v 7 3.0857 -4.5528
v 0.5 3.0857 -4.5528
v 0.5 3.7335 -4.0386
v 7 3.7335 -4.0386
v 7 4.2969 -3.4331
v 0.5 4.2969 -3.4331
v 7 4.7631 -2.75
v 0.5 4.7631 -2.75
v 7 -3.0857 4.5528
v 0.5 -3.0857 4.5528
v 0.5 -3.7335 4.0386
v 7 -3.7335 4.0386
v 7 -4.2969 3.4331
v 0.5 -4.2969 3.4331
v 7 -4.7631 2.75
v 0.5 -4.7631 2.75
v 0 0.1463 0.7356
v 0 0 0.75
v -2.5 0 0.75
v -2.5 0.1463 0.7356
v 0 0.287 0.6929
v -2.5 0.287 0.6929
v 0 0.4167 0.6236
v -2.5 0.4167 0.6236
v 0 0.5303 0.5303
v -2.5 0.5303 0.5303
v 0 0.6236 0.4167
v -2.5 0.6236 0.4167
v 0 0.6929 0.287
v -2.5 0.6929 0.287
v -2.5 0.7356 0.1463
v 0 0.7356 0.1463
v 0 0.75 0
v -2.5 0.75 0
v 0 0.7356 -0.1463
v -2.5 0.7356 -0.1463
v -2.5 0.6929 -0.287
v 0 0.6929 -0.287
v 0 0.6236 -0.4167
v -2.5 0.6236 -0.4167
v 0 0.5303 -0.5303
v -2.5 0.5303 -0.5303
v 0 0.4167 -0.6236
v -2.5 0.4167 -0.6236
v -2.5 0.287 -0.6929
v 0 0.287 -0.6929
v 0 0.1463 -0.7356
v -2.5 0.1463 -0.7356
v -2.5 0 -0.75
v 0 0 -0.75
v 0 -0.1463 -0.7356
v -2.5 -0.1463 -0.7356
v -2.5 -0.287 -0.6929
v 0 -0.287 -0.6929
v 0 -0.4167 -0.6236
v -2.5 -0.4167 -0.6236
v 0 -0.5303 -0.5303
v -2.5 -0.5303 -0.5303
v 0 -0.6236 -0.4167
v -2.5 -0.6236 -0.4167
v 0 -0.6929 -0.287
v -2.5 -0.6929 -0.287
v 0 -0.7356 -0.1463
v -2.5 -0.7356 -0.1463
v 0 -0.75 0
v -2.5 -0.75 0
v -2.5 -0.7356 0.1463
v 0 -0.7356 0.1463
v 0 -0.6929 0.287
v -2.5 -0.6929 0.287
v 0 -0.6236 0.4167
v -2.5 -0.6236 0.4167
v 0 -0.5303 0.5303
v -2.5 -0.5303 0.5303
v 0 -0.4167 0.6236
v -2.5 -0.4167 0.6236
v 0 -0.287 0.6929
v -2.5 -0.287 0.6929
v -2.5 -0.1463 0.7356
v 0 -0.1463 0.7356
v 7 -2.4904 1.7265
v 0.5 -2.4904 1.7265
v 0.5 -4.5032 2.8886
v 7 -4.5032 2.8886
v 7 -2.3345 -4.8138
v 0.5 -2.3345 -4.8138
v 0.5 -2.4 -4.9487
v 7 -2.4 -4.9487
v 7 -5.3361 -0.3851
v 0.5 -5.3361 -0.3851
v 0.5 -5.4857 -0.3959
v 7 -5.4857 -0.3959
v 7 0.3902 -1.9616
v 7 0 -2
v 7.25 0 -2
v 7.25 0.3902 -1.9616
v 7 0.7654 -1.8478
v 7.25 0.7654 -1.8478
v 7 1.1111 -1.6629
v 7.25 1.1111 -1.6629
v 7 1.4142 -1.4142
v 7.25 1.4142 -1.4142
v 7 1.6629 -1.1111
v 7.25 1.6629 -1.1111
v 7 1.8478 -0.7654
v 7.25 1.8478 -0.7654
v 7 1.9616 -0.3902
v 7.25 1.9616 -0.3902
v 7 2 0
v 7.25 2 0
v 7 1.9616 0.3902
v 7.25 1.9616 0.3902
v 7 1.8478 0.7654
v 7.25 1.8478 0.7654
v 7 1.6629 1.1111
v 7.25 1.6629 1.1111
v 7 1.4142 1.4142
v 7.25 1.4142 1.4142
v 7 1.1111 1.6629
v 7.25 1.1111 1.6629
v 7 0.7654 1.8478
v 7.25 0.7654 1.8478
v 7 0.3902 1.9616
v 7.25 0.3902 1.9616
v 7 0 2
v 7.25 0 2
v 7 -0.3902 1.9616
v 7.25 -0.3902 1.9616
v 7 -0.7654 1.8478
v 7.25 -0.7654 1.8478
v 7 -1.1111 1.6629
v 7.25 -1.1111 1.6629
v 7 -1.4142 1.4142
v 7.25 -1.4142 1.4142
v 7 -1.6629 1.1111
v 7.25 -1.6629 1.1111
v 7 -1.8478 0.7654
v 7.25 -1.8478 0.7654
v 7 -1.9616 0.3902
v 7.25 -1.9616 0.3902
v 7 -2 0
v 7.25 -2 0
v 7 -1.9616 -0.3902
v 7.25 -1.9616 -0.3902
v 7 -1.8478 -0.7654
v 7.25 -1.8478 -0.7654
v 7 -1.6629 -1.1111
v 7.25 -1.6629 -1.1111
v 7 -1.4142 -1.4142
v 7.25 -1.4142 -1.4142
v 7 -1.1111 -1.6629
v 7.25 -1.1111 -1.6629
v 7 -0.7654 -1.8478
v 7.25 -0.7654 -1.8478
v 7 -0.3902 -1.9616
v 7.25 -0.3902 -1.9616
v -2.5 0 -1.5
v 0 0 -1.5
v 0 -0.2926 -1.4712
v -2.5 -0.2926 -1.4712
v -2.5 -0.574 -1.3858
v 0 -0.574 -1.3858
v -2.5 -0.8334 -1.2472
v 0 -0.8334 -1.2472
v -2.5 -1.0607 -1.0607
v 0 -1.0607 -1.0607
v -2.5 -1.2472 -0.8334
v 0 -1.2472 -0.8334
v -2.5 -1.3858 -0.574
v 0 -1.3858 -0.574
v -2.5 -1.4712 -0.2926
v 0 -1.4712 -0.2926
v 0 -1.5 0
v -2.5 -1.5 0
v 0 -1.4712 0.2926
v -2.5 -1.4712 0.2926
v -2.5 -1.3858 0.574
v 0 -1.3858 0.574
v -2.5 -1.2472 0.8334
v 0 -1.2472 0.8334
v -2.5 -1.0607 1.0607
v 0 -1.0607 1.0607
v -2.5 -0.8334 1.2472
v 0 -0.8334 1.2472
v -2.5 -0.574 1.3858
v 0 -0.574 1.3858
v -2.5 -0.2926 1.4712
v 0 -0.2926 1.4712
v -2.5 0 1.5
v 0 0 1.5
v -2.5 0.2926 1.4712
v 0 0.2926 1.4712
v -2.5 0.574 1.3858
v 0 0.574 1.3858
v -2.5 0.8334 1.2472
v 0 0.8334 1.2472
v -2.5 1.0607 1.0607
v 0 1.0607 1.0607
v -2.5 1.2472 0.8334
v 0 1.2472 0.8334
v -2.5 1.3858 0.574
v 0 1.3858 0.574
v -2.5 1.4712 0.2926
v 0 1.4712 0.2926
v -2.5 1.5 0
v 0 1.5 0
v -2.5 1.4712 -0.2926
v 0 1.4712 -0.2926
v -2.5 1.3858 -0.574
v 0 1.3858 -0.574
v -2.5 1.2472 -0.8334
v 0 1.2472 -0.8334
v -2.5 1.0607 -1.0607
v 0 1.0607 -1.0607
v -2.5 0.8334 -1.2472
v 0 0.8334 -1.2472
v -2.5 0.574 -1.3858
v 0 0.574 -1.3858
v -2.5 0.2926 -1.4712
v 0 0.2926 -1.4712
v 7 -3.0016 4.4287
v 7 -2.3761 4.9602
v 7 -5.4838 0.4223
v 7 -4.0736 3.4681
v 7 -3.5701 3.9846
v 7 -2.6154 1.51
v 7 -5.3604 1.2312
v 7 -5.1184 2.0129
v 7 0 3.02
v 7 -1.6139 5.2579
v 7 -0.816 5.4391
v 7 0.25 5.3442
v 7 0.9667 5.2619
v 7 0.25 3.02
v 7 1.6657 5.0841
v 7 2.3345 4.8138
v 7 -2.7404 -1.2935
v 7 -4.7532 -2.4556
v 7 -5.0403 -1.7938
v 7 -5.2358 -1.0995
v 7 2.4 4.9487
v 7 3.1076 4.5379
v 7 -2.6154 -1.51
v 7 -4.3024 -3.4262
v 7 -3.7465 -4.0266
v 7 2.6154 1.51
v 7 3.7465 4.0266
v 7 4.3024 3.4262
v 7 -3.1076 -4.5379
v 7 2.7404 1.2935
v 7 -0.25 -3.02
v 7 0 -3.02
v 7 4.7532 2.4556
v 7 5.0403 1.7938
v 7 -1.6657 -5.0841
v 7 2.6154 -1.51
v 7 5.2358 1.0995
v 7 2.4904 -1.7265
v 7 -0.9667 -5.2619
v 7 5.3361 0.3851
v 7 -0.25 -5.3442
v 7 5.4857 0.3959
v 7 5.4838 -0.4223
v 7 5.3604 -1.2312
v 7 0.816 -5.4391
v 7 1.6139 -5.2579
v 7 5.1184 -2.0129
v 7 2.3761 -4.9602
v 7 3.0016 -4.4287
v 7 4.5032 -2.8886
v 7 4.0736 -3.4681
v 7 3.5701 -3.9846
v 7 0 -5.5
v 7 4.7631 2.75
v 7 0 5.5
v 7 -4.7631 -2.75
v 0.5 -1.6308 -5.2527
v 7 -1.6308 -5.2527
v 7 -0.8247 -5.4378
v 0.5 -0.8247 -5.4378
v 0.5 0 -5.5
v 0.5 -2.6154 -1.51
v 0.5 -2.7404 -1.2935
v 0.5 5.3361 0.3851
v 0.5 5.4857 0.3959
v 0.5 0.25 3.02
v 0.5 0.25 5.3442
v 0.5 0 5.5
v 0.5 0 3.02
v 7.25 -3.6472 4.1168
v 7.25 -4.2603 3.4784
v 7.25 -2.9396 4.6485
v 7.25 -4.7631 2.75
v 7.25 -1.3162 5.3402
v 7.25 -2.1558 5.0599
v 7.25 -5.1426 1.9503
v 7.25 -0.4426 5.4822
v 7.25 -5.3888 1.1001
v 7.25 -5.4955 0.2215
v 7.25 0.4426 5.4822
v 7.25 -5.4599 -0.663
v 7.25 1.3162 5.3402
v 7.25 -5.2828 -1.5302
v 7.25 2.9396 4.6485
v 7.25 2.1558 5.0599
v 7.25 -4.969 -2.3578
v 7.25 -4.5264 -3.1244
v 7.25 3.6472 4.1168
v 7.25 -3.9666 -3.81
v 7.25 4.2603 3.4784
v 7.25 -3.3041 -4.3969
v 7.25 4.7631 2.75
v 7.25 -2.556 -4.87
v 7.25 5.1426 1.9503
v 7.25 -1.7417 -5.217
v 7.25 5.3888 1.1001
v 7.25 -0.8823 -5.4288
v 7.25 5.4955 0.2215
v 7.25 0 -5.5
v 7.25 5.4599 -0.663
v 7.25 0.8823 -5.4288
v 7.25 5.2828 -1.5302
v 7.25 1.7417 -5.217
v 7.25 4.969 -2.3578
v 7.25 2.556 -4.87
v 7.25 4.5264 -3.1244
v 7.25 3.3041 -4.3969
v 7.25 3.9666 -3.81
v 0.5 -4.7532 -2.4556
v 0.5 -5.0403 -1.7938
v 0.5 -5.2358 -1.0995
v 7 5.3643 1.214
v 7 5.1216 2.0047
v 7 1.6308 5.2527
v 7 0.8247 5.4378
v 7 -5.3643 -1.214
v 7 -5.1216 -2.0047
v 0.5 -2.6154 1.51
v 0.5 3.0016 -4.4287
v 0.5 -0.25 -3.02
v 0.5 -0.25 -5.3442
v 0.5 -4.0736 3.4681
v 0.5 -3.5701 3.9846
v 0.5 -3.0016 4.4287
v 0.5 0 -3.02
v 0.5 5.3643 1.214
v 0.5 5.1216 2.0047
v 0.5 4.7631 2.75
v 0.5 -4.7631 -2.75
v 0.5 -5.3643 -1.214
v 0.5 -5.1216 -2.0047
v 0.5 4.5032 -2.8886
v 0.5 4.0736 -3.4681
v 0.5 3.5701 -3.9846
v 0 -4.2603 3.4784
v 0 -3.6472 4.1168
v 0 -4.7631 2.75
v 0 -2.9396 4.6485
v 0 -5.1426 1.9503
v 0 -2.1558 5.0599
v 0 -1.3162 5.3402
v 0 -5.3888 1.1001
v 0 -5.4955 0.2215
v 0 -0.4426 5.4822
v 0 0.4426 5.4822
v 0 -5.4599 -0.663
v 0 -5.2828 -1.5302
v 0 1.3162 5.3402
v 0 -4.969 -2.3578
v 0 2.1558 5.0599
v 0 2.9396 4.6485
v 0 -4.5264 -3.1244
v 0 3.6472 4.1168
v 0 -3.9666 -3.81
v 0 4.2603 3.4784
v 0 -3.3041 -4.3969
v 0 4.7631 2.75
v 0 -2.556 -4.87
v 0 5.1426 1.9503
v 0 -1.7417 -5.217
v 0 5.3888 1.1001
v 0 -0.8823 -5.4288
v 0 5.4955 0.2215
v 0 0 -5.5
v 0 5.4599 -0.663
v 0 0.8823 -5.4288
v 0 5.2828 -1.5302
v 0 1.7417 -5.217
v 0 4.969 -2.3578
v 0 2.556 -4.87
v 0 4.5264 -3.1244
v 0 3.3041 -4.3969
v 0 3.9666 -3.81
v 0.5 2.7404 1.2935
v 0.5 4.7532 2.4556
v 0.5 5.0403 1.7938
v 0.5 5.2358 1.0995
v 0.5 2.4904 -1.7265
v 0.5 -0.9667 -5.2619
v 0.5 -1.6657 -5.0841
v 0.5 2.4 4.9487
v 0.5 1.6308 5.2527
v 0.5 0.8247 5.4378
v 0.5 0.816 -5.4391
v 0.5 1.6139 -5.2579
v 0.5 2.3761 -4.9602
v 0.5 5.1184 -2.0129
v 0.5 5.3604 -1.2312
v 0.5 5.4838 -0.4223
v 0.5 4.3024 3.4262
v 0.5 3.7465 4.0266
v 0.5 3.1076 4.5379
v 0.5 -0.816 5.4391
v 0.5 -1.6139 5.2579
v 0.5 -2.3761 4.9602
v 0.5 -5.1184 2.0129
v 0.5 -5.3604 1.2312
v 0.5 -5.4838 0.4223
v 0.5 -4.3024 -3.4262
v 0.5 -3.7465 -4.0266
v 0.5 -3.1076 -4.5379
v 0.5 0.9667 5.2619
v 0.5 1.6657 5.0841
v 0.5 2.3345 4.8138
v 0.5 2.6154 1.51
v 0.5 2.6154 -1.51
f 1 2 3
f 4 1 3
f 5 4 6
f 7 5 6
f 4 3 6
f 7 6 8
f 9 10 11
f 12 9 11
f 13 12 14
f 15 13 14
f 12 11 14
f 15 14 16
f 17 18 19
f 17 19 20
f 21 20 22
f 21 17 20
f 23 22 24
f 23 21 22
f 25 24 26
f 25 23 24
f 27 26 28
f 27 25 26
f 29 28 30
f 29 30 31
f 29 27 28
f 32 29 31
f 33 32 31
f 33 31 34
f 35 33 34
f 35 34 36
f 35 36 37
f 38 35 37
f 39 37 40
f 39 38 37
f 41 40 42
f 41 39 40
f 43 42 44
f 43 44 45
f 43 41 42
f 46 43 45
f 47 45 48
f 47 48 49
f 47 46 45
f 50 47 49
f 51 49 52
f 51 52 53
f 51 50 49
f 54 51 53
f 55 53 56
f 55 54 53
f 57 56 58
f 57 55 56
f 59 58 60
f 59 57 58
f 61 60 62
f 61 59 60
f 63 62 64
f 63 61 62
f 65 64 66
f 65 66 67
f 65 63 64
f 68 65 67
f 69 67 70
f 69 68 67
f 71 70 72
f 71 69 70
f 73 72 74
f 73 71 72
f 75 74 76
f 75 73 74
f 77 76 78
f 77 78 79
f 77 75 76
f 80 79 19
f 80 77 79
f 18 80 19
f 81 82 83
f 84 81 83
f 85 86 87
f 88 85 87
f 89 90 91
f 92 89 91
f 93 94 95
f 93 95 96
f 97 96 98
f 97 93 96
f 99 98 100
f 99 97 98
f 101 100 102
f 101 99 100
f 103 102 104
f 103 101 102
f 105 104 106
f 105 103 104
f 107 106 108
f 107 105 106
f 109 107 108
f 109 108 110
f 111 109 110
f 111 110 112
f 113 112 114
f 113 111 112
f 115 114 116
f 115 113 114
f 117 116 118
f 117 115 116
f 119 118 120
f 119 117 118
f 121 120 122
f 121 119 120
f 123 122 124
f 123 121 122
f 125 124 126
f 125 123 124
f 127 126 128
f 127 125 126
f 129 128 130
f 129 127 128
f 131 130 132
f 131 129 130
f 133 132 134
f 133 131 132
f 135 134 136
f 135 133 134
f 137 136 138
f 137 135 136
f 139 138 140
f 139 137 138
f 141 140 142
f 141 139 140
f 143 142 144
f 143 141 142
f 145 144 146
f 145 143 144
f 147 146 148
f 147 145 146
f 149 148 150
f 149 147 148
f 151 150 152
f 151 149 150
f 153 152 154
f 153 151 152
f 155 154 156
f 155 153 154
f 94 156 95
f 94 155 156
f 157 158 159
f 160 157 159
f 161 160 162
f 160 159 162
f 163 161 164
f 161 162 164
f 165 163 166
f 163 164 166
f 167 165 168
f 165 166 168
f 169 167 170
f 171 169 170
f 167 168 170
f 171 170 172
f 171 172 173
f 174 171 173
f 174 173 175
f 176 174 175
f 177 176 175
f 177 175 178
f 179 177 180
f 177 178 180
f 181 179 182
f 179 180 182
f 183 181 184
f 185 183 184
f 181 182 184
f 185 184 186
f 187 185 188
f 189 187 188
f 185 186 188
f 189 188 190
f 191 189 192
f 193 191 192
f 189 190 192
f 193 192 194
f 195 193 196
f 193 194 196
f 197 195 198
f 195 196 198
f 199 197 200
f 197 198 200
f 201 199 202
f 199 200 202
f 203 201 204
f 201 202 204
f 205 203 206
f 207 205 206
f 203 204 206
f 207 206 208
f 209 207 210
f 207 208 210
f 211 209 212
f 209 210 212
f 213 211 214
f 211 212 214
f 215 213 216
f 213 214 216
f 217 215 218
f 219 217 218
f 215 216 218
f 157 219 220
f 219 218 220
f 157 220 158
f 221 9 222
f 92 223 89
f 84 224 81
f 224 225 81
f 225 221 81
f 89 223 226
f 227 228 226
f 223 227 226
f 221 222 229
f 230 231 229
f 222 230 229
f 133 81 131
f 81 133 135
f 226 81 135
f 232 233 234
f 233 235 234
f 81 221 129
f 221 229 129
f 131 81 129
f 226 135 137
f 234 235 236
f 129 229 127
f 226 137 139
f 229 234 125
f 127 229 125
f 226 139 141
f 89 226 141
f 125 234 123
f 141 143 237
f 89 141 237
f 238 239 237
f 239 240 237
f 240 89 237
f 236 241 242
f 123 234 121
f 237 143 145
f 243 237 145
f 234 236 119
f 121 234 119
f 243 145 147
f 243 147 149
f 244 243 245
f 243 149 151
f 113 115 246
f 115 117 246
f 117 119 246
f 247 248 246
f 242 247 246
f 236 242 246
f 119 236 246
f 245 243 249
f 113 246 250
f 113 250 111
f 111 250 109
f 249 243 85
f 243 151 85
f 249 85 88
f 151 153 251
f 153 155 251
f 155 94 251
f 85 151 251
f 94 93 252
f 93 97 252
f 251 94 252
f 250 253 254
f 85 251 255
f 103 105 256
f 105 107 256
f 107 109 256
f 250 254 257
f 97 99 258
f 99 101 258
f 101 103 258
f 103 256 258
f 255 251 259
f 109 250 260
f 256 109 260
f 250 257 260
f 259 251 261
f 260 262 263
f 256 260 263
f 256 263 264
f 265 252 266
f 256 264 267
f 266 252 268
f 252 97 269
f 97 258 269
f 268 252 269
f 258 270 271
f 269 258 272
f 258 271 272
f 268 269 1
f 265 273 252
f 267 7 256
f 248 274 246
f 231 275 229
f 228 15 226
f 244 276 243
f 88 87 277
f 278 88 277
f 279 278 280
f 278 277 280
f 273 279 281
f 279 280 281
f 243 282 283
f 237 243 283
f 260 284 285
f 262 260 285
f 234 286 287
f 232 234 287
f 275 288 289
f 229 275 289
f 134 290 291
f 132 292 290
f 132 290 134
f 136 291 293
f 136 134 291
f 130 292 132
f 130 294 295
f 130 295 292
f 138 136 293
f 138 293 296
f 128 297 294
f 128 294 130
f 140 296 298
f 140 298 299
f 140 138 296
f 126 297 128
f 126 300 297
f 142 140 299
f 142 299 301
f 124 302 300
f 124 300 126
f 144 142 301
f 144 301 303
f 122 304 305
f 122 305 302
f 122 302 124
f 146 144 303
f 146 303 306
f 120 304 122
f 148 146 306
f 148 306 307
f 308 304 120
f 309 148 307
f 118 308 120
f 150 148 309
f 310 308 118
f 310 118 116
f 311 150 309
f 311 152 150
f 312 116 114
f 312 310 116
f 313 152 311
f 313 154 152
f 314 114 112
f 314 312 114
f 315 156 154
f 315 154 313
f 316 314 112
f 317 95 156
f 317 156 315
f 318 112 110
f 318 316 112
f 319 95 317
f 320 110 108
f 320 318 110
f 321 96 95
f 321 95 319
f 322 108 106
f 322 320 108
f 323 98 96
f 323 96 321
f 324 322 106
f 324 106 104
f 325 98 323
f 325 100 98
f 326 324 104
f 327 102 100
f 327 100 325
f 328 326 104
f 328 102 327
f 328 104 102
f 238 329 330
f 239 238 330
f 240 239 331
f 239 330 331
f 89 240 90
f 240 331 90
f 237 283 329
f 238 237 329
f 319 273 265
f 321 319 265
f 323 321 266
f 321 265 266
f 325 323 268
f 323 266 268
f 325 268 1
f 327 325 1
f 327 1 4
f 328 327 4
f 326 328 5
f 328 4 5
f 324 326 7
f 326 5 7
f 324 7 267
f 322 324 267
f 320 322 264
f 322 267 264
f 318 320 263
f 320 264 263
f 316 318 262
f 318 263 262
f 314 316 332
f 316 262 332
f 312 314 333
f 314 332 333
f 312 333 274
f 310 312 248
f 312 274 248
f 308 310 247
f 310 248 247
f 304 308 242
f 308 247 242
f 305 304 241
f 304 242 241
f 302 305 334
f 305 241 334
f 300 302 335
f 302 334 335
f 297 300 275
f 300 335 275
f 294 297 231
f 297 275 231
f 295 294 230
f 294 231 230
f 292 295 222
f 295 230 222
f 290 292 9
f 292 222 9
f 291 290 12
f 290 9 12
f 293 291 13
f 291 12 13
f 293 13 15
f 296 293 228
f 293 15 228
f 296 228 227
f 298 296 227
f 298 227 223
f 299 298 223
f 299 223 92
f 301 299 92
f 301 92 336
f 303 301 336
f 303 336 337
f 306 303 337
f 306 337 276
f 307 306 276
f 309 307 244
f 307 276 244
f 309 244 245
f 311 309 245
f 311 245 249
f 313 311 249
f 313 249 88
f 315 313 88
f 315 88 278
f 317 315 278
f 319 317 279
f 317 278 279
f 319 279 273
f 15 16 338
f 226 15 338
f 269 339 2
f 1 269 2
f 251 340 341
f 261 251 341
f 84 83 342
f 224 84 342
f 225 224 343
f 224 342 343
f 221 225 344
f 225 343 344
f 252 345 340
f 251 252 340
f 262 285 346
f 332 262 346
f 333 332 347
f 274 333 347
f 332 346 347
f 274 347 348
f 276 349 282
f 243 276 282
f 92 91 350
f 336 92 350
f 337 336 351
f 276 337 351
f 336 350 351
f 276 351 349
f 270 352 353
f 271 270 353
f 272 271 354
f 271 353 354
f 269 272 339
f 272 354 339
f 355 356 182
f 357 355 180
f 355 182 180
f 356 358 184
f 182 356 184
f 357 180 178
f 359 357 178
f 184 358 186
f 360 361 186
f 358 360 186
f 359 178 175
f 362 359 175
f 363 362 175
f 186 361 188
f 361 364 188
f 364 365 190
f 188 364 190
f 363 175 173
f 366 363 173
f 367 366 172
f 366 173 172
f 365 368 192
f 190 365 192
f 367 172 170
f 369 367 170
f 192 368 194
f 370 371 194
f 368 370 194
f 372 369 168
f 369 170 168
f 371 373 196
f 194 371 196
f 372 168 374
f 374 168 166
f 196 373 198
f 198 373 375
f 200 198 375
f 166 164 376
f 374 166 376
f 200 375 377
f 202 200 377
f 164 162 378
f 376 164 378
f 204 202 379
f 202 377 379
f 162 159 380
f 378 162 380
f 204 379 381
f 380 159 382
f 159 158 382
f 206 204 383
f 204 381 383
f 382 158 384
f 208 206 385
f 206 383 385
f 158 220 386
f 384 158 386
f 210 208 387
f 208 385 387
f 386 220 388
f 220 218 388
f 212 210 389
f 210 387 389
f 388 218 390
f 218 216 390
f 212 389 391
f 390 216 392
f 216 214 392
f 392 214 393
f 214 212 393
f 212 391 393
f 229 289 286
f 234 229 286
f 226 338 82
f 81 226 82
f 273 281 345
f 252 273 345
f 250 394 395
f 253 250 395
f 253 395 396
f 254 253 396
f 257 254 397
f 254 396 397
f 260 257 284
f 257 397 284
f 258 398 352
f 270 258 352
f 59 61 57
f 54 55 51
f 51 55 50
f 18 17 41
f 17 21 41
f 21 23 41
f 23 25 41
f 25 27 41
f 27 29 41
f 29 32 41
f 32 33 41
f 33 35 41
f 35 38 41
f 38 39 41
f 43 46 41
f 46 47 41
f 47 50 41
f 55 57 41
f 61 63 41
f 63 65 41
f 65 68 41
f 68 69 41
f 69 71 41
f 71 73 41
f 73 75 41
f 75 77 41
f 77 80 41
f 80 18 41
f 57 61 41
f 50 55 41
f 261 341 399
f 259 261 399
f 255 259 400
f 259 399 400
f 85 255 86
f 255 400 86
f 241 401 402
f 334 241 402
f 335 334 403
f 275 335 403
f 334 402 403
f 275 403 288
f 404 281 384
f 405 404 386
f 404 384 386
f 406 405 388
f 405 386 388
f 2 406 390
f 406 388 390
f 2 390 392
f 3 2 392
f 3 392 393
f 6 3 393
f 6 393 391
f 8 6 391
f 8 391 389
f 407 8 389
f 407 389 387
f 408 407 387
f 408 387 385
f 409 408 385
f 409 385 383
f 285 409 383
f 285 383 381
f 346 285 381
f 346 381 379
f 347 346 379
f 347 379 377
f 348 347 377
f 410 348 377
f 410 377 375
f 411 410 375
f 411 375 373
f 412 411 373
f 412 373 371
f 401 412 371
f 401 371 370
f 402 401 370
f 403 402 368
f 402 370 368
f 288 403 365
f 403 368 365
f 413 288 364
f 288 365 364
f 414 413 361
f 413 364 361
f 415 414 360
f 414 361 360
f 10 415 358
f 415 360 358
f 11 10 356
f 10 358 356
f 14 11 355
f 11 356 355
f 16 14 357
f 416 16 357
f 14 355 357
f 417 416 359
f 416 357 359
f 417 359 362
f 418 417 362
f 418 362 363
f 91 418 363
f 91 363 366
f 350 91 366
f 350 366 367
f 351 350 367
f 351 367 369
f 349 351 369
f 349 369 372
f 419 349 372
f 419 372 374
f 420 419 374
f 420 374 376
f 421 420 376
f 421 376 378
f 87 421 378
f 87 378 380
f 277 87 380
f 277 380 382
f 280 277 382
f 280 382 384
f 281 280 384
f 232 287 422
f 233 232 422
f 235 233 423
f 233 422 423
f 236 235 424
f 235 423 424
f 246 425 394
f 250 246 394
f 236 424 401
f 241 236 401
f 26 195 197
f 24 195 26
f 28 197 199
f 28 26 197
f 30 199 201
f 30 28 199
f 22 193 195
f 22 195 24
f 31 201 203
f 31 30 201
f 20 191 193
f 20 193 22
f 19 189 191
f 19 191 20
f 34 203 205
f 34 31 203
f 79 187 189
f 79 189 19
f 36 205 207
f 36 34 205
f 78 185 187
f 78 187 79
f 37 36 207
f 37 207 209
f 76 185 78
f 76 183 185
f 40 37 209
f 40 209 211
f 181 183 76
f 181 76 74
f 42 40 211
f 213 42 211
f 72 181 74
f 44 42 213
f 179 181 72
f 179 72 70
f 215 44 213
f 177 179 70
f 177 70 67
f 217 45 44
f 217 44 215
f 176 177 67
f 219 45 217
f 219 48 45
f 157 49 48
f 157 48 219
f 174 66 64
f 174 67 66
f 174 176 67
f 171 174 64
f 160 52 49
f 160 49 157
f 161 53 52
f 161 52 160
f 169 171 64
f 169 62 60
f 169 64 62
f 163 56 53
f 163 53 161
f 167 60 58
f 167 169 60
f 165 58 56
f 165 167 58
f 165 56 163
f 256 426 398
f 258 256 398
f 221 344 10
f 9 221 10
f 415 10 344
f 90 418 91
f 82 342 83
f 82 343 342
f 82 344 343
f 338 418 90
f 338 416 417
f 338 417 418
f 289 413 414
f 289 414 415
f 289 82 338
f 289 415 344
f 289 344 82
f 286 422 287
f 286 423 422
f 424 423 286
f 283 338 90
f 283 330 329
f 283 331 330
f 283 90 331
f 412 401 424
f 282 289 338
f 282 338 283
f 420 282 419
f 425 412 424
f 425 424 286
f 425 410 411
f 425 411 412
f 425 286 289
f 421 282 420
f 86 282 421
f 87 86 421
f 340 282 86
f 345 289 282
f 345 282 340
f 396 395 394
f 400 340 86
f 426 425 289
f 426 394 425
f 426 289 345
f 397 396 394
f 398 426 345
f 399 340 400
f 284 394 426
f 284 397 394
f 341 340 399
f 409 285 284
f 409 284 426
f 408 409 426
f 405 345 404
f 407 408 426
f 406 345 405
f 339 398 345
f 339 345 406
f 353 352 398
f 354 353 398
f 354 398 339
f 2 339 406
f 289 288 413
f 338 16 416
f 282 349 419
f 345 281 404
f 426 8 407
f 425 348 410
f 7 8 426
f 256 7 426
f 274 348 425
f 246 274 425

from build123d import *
from build123d.topology import SkipClean

# Parameters (mm, degrees)
SKETCH1_R           = 5.5
BOSS_EXTRUDE1_DEPTH = 0.5
BOSS_EXTRUDE2_DEPTH = 6.5
CIRPATTERN1_COUNT   = 6
SKETCH3_R           = 5.5
SKETCH3_R_2         = 2
BOSS_EXTRUDE3_DEPTH = 0.25
SKETCH4_R           = 1.5
SKETCH4_R_2         = 0.75
BOSS_EXTRUDE4_DEPTH = 2.5


with BuildPart() as part:
    # Sketch1 → Boss-Extrude1 (new body)
    with BuildSketch(Plane(origin=(0, 0, 0), x_dir=(0, 0, -1), z_dir=(1, 0, 0))):
        Circle(SKETCH1_R)
    extrude(amount=BOSS_EXTRUDE1_DEPTH)

    # Sketch2 → Boss-Extrude2 (add)
    with BuildSketch(Plane(origin=(0.5, 0, 0), x_dir=(0, 0, -1), z_dir=(1, 0, 0))):
        with BuildLine():
            Line((-5.5, 0), (-3.02, 0))
            Line((-3.02, 0), (-3.02, 0.25))
            Line((-3.02, 0.25), (-5.344155686, 0.25))
            ThreePointArc((-5.344155686, 0.25), (-5.184805145, 1.319202641), (-4.813771652, 2.334545455))
            Line((-4.813771652, 2.334545455), (-4.948737213, 2.4))
            ThreePointArc((-4.948737213, 2.4), (-5.360412982, 1.231248417), (-5.5, 0))
        make_face()
    boss_extrude2 = extrude(amount=BOSS_EXTRUDE2_DEPTH)

    # CirPattern1: Boss-Extrude2 ×6 about axis
    with SkipClean():  # keep this step's faces unmerged: merging them makes the solid invalid here
        cirpattern1_axis = Axis((0, 0, 0), (1, 0, 0))
        for i in range(1, CIRPATTERN1_COUNT):
            add(boss_extrude2.rotate(cirpattern1_axis, i * 360 / CIRPATTERN1_COUNT))

    # Sketch3 → Boss-Extrude3 (add)
    with BuildSketch(Plane(origin=(7, 0, 0), x_dir=(0, 0, -1), z_dir=(1, 0, 0))):
        Circle(SKETCH3_R)
        Circle(SKETCH3_R_2, mode=Mode.SUBTRACT)
    extrude(amount=BOSS_EXTRUDE3_DEPTH)

    # Sketch4 → Boss-Extrude4 (add)
    with SkipClean():  # keep this step's faces unmerged: merging them makes the solid invalid here
        with BuildSketch(Plane.ZY):
            with Locations(Location((0, 0, 0), (0, 0, 180))):  # turned: the seam where the file's is
                Circle(SKETCH4_R)
            Circle(SKETCH4_R_2, mode=Mode.SUBTRACT)
        extrude(amount=BOSS_EXTRUDE4_DEPTH)


solid = part.part
